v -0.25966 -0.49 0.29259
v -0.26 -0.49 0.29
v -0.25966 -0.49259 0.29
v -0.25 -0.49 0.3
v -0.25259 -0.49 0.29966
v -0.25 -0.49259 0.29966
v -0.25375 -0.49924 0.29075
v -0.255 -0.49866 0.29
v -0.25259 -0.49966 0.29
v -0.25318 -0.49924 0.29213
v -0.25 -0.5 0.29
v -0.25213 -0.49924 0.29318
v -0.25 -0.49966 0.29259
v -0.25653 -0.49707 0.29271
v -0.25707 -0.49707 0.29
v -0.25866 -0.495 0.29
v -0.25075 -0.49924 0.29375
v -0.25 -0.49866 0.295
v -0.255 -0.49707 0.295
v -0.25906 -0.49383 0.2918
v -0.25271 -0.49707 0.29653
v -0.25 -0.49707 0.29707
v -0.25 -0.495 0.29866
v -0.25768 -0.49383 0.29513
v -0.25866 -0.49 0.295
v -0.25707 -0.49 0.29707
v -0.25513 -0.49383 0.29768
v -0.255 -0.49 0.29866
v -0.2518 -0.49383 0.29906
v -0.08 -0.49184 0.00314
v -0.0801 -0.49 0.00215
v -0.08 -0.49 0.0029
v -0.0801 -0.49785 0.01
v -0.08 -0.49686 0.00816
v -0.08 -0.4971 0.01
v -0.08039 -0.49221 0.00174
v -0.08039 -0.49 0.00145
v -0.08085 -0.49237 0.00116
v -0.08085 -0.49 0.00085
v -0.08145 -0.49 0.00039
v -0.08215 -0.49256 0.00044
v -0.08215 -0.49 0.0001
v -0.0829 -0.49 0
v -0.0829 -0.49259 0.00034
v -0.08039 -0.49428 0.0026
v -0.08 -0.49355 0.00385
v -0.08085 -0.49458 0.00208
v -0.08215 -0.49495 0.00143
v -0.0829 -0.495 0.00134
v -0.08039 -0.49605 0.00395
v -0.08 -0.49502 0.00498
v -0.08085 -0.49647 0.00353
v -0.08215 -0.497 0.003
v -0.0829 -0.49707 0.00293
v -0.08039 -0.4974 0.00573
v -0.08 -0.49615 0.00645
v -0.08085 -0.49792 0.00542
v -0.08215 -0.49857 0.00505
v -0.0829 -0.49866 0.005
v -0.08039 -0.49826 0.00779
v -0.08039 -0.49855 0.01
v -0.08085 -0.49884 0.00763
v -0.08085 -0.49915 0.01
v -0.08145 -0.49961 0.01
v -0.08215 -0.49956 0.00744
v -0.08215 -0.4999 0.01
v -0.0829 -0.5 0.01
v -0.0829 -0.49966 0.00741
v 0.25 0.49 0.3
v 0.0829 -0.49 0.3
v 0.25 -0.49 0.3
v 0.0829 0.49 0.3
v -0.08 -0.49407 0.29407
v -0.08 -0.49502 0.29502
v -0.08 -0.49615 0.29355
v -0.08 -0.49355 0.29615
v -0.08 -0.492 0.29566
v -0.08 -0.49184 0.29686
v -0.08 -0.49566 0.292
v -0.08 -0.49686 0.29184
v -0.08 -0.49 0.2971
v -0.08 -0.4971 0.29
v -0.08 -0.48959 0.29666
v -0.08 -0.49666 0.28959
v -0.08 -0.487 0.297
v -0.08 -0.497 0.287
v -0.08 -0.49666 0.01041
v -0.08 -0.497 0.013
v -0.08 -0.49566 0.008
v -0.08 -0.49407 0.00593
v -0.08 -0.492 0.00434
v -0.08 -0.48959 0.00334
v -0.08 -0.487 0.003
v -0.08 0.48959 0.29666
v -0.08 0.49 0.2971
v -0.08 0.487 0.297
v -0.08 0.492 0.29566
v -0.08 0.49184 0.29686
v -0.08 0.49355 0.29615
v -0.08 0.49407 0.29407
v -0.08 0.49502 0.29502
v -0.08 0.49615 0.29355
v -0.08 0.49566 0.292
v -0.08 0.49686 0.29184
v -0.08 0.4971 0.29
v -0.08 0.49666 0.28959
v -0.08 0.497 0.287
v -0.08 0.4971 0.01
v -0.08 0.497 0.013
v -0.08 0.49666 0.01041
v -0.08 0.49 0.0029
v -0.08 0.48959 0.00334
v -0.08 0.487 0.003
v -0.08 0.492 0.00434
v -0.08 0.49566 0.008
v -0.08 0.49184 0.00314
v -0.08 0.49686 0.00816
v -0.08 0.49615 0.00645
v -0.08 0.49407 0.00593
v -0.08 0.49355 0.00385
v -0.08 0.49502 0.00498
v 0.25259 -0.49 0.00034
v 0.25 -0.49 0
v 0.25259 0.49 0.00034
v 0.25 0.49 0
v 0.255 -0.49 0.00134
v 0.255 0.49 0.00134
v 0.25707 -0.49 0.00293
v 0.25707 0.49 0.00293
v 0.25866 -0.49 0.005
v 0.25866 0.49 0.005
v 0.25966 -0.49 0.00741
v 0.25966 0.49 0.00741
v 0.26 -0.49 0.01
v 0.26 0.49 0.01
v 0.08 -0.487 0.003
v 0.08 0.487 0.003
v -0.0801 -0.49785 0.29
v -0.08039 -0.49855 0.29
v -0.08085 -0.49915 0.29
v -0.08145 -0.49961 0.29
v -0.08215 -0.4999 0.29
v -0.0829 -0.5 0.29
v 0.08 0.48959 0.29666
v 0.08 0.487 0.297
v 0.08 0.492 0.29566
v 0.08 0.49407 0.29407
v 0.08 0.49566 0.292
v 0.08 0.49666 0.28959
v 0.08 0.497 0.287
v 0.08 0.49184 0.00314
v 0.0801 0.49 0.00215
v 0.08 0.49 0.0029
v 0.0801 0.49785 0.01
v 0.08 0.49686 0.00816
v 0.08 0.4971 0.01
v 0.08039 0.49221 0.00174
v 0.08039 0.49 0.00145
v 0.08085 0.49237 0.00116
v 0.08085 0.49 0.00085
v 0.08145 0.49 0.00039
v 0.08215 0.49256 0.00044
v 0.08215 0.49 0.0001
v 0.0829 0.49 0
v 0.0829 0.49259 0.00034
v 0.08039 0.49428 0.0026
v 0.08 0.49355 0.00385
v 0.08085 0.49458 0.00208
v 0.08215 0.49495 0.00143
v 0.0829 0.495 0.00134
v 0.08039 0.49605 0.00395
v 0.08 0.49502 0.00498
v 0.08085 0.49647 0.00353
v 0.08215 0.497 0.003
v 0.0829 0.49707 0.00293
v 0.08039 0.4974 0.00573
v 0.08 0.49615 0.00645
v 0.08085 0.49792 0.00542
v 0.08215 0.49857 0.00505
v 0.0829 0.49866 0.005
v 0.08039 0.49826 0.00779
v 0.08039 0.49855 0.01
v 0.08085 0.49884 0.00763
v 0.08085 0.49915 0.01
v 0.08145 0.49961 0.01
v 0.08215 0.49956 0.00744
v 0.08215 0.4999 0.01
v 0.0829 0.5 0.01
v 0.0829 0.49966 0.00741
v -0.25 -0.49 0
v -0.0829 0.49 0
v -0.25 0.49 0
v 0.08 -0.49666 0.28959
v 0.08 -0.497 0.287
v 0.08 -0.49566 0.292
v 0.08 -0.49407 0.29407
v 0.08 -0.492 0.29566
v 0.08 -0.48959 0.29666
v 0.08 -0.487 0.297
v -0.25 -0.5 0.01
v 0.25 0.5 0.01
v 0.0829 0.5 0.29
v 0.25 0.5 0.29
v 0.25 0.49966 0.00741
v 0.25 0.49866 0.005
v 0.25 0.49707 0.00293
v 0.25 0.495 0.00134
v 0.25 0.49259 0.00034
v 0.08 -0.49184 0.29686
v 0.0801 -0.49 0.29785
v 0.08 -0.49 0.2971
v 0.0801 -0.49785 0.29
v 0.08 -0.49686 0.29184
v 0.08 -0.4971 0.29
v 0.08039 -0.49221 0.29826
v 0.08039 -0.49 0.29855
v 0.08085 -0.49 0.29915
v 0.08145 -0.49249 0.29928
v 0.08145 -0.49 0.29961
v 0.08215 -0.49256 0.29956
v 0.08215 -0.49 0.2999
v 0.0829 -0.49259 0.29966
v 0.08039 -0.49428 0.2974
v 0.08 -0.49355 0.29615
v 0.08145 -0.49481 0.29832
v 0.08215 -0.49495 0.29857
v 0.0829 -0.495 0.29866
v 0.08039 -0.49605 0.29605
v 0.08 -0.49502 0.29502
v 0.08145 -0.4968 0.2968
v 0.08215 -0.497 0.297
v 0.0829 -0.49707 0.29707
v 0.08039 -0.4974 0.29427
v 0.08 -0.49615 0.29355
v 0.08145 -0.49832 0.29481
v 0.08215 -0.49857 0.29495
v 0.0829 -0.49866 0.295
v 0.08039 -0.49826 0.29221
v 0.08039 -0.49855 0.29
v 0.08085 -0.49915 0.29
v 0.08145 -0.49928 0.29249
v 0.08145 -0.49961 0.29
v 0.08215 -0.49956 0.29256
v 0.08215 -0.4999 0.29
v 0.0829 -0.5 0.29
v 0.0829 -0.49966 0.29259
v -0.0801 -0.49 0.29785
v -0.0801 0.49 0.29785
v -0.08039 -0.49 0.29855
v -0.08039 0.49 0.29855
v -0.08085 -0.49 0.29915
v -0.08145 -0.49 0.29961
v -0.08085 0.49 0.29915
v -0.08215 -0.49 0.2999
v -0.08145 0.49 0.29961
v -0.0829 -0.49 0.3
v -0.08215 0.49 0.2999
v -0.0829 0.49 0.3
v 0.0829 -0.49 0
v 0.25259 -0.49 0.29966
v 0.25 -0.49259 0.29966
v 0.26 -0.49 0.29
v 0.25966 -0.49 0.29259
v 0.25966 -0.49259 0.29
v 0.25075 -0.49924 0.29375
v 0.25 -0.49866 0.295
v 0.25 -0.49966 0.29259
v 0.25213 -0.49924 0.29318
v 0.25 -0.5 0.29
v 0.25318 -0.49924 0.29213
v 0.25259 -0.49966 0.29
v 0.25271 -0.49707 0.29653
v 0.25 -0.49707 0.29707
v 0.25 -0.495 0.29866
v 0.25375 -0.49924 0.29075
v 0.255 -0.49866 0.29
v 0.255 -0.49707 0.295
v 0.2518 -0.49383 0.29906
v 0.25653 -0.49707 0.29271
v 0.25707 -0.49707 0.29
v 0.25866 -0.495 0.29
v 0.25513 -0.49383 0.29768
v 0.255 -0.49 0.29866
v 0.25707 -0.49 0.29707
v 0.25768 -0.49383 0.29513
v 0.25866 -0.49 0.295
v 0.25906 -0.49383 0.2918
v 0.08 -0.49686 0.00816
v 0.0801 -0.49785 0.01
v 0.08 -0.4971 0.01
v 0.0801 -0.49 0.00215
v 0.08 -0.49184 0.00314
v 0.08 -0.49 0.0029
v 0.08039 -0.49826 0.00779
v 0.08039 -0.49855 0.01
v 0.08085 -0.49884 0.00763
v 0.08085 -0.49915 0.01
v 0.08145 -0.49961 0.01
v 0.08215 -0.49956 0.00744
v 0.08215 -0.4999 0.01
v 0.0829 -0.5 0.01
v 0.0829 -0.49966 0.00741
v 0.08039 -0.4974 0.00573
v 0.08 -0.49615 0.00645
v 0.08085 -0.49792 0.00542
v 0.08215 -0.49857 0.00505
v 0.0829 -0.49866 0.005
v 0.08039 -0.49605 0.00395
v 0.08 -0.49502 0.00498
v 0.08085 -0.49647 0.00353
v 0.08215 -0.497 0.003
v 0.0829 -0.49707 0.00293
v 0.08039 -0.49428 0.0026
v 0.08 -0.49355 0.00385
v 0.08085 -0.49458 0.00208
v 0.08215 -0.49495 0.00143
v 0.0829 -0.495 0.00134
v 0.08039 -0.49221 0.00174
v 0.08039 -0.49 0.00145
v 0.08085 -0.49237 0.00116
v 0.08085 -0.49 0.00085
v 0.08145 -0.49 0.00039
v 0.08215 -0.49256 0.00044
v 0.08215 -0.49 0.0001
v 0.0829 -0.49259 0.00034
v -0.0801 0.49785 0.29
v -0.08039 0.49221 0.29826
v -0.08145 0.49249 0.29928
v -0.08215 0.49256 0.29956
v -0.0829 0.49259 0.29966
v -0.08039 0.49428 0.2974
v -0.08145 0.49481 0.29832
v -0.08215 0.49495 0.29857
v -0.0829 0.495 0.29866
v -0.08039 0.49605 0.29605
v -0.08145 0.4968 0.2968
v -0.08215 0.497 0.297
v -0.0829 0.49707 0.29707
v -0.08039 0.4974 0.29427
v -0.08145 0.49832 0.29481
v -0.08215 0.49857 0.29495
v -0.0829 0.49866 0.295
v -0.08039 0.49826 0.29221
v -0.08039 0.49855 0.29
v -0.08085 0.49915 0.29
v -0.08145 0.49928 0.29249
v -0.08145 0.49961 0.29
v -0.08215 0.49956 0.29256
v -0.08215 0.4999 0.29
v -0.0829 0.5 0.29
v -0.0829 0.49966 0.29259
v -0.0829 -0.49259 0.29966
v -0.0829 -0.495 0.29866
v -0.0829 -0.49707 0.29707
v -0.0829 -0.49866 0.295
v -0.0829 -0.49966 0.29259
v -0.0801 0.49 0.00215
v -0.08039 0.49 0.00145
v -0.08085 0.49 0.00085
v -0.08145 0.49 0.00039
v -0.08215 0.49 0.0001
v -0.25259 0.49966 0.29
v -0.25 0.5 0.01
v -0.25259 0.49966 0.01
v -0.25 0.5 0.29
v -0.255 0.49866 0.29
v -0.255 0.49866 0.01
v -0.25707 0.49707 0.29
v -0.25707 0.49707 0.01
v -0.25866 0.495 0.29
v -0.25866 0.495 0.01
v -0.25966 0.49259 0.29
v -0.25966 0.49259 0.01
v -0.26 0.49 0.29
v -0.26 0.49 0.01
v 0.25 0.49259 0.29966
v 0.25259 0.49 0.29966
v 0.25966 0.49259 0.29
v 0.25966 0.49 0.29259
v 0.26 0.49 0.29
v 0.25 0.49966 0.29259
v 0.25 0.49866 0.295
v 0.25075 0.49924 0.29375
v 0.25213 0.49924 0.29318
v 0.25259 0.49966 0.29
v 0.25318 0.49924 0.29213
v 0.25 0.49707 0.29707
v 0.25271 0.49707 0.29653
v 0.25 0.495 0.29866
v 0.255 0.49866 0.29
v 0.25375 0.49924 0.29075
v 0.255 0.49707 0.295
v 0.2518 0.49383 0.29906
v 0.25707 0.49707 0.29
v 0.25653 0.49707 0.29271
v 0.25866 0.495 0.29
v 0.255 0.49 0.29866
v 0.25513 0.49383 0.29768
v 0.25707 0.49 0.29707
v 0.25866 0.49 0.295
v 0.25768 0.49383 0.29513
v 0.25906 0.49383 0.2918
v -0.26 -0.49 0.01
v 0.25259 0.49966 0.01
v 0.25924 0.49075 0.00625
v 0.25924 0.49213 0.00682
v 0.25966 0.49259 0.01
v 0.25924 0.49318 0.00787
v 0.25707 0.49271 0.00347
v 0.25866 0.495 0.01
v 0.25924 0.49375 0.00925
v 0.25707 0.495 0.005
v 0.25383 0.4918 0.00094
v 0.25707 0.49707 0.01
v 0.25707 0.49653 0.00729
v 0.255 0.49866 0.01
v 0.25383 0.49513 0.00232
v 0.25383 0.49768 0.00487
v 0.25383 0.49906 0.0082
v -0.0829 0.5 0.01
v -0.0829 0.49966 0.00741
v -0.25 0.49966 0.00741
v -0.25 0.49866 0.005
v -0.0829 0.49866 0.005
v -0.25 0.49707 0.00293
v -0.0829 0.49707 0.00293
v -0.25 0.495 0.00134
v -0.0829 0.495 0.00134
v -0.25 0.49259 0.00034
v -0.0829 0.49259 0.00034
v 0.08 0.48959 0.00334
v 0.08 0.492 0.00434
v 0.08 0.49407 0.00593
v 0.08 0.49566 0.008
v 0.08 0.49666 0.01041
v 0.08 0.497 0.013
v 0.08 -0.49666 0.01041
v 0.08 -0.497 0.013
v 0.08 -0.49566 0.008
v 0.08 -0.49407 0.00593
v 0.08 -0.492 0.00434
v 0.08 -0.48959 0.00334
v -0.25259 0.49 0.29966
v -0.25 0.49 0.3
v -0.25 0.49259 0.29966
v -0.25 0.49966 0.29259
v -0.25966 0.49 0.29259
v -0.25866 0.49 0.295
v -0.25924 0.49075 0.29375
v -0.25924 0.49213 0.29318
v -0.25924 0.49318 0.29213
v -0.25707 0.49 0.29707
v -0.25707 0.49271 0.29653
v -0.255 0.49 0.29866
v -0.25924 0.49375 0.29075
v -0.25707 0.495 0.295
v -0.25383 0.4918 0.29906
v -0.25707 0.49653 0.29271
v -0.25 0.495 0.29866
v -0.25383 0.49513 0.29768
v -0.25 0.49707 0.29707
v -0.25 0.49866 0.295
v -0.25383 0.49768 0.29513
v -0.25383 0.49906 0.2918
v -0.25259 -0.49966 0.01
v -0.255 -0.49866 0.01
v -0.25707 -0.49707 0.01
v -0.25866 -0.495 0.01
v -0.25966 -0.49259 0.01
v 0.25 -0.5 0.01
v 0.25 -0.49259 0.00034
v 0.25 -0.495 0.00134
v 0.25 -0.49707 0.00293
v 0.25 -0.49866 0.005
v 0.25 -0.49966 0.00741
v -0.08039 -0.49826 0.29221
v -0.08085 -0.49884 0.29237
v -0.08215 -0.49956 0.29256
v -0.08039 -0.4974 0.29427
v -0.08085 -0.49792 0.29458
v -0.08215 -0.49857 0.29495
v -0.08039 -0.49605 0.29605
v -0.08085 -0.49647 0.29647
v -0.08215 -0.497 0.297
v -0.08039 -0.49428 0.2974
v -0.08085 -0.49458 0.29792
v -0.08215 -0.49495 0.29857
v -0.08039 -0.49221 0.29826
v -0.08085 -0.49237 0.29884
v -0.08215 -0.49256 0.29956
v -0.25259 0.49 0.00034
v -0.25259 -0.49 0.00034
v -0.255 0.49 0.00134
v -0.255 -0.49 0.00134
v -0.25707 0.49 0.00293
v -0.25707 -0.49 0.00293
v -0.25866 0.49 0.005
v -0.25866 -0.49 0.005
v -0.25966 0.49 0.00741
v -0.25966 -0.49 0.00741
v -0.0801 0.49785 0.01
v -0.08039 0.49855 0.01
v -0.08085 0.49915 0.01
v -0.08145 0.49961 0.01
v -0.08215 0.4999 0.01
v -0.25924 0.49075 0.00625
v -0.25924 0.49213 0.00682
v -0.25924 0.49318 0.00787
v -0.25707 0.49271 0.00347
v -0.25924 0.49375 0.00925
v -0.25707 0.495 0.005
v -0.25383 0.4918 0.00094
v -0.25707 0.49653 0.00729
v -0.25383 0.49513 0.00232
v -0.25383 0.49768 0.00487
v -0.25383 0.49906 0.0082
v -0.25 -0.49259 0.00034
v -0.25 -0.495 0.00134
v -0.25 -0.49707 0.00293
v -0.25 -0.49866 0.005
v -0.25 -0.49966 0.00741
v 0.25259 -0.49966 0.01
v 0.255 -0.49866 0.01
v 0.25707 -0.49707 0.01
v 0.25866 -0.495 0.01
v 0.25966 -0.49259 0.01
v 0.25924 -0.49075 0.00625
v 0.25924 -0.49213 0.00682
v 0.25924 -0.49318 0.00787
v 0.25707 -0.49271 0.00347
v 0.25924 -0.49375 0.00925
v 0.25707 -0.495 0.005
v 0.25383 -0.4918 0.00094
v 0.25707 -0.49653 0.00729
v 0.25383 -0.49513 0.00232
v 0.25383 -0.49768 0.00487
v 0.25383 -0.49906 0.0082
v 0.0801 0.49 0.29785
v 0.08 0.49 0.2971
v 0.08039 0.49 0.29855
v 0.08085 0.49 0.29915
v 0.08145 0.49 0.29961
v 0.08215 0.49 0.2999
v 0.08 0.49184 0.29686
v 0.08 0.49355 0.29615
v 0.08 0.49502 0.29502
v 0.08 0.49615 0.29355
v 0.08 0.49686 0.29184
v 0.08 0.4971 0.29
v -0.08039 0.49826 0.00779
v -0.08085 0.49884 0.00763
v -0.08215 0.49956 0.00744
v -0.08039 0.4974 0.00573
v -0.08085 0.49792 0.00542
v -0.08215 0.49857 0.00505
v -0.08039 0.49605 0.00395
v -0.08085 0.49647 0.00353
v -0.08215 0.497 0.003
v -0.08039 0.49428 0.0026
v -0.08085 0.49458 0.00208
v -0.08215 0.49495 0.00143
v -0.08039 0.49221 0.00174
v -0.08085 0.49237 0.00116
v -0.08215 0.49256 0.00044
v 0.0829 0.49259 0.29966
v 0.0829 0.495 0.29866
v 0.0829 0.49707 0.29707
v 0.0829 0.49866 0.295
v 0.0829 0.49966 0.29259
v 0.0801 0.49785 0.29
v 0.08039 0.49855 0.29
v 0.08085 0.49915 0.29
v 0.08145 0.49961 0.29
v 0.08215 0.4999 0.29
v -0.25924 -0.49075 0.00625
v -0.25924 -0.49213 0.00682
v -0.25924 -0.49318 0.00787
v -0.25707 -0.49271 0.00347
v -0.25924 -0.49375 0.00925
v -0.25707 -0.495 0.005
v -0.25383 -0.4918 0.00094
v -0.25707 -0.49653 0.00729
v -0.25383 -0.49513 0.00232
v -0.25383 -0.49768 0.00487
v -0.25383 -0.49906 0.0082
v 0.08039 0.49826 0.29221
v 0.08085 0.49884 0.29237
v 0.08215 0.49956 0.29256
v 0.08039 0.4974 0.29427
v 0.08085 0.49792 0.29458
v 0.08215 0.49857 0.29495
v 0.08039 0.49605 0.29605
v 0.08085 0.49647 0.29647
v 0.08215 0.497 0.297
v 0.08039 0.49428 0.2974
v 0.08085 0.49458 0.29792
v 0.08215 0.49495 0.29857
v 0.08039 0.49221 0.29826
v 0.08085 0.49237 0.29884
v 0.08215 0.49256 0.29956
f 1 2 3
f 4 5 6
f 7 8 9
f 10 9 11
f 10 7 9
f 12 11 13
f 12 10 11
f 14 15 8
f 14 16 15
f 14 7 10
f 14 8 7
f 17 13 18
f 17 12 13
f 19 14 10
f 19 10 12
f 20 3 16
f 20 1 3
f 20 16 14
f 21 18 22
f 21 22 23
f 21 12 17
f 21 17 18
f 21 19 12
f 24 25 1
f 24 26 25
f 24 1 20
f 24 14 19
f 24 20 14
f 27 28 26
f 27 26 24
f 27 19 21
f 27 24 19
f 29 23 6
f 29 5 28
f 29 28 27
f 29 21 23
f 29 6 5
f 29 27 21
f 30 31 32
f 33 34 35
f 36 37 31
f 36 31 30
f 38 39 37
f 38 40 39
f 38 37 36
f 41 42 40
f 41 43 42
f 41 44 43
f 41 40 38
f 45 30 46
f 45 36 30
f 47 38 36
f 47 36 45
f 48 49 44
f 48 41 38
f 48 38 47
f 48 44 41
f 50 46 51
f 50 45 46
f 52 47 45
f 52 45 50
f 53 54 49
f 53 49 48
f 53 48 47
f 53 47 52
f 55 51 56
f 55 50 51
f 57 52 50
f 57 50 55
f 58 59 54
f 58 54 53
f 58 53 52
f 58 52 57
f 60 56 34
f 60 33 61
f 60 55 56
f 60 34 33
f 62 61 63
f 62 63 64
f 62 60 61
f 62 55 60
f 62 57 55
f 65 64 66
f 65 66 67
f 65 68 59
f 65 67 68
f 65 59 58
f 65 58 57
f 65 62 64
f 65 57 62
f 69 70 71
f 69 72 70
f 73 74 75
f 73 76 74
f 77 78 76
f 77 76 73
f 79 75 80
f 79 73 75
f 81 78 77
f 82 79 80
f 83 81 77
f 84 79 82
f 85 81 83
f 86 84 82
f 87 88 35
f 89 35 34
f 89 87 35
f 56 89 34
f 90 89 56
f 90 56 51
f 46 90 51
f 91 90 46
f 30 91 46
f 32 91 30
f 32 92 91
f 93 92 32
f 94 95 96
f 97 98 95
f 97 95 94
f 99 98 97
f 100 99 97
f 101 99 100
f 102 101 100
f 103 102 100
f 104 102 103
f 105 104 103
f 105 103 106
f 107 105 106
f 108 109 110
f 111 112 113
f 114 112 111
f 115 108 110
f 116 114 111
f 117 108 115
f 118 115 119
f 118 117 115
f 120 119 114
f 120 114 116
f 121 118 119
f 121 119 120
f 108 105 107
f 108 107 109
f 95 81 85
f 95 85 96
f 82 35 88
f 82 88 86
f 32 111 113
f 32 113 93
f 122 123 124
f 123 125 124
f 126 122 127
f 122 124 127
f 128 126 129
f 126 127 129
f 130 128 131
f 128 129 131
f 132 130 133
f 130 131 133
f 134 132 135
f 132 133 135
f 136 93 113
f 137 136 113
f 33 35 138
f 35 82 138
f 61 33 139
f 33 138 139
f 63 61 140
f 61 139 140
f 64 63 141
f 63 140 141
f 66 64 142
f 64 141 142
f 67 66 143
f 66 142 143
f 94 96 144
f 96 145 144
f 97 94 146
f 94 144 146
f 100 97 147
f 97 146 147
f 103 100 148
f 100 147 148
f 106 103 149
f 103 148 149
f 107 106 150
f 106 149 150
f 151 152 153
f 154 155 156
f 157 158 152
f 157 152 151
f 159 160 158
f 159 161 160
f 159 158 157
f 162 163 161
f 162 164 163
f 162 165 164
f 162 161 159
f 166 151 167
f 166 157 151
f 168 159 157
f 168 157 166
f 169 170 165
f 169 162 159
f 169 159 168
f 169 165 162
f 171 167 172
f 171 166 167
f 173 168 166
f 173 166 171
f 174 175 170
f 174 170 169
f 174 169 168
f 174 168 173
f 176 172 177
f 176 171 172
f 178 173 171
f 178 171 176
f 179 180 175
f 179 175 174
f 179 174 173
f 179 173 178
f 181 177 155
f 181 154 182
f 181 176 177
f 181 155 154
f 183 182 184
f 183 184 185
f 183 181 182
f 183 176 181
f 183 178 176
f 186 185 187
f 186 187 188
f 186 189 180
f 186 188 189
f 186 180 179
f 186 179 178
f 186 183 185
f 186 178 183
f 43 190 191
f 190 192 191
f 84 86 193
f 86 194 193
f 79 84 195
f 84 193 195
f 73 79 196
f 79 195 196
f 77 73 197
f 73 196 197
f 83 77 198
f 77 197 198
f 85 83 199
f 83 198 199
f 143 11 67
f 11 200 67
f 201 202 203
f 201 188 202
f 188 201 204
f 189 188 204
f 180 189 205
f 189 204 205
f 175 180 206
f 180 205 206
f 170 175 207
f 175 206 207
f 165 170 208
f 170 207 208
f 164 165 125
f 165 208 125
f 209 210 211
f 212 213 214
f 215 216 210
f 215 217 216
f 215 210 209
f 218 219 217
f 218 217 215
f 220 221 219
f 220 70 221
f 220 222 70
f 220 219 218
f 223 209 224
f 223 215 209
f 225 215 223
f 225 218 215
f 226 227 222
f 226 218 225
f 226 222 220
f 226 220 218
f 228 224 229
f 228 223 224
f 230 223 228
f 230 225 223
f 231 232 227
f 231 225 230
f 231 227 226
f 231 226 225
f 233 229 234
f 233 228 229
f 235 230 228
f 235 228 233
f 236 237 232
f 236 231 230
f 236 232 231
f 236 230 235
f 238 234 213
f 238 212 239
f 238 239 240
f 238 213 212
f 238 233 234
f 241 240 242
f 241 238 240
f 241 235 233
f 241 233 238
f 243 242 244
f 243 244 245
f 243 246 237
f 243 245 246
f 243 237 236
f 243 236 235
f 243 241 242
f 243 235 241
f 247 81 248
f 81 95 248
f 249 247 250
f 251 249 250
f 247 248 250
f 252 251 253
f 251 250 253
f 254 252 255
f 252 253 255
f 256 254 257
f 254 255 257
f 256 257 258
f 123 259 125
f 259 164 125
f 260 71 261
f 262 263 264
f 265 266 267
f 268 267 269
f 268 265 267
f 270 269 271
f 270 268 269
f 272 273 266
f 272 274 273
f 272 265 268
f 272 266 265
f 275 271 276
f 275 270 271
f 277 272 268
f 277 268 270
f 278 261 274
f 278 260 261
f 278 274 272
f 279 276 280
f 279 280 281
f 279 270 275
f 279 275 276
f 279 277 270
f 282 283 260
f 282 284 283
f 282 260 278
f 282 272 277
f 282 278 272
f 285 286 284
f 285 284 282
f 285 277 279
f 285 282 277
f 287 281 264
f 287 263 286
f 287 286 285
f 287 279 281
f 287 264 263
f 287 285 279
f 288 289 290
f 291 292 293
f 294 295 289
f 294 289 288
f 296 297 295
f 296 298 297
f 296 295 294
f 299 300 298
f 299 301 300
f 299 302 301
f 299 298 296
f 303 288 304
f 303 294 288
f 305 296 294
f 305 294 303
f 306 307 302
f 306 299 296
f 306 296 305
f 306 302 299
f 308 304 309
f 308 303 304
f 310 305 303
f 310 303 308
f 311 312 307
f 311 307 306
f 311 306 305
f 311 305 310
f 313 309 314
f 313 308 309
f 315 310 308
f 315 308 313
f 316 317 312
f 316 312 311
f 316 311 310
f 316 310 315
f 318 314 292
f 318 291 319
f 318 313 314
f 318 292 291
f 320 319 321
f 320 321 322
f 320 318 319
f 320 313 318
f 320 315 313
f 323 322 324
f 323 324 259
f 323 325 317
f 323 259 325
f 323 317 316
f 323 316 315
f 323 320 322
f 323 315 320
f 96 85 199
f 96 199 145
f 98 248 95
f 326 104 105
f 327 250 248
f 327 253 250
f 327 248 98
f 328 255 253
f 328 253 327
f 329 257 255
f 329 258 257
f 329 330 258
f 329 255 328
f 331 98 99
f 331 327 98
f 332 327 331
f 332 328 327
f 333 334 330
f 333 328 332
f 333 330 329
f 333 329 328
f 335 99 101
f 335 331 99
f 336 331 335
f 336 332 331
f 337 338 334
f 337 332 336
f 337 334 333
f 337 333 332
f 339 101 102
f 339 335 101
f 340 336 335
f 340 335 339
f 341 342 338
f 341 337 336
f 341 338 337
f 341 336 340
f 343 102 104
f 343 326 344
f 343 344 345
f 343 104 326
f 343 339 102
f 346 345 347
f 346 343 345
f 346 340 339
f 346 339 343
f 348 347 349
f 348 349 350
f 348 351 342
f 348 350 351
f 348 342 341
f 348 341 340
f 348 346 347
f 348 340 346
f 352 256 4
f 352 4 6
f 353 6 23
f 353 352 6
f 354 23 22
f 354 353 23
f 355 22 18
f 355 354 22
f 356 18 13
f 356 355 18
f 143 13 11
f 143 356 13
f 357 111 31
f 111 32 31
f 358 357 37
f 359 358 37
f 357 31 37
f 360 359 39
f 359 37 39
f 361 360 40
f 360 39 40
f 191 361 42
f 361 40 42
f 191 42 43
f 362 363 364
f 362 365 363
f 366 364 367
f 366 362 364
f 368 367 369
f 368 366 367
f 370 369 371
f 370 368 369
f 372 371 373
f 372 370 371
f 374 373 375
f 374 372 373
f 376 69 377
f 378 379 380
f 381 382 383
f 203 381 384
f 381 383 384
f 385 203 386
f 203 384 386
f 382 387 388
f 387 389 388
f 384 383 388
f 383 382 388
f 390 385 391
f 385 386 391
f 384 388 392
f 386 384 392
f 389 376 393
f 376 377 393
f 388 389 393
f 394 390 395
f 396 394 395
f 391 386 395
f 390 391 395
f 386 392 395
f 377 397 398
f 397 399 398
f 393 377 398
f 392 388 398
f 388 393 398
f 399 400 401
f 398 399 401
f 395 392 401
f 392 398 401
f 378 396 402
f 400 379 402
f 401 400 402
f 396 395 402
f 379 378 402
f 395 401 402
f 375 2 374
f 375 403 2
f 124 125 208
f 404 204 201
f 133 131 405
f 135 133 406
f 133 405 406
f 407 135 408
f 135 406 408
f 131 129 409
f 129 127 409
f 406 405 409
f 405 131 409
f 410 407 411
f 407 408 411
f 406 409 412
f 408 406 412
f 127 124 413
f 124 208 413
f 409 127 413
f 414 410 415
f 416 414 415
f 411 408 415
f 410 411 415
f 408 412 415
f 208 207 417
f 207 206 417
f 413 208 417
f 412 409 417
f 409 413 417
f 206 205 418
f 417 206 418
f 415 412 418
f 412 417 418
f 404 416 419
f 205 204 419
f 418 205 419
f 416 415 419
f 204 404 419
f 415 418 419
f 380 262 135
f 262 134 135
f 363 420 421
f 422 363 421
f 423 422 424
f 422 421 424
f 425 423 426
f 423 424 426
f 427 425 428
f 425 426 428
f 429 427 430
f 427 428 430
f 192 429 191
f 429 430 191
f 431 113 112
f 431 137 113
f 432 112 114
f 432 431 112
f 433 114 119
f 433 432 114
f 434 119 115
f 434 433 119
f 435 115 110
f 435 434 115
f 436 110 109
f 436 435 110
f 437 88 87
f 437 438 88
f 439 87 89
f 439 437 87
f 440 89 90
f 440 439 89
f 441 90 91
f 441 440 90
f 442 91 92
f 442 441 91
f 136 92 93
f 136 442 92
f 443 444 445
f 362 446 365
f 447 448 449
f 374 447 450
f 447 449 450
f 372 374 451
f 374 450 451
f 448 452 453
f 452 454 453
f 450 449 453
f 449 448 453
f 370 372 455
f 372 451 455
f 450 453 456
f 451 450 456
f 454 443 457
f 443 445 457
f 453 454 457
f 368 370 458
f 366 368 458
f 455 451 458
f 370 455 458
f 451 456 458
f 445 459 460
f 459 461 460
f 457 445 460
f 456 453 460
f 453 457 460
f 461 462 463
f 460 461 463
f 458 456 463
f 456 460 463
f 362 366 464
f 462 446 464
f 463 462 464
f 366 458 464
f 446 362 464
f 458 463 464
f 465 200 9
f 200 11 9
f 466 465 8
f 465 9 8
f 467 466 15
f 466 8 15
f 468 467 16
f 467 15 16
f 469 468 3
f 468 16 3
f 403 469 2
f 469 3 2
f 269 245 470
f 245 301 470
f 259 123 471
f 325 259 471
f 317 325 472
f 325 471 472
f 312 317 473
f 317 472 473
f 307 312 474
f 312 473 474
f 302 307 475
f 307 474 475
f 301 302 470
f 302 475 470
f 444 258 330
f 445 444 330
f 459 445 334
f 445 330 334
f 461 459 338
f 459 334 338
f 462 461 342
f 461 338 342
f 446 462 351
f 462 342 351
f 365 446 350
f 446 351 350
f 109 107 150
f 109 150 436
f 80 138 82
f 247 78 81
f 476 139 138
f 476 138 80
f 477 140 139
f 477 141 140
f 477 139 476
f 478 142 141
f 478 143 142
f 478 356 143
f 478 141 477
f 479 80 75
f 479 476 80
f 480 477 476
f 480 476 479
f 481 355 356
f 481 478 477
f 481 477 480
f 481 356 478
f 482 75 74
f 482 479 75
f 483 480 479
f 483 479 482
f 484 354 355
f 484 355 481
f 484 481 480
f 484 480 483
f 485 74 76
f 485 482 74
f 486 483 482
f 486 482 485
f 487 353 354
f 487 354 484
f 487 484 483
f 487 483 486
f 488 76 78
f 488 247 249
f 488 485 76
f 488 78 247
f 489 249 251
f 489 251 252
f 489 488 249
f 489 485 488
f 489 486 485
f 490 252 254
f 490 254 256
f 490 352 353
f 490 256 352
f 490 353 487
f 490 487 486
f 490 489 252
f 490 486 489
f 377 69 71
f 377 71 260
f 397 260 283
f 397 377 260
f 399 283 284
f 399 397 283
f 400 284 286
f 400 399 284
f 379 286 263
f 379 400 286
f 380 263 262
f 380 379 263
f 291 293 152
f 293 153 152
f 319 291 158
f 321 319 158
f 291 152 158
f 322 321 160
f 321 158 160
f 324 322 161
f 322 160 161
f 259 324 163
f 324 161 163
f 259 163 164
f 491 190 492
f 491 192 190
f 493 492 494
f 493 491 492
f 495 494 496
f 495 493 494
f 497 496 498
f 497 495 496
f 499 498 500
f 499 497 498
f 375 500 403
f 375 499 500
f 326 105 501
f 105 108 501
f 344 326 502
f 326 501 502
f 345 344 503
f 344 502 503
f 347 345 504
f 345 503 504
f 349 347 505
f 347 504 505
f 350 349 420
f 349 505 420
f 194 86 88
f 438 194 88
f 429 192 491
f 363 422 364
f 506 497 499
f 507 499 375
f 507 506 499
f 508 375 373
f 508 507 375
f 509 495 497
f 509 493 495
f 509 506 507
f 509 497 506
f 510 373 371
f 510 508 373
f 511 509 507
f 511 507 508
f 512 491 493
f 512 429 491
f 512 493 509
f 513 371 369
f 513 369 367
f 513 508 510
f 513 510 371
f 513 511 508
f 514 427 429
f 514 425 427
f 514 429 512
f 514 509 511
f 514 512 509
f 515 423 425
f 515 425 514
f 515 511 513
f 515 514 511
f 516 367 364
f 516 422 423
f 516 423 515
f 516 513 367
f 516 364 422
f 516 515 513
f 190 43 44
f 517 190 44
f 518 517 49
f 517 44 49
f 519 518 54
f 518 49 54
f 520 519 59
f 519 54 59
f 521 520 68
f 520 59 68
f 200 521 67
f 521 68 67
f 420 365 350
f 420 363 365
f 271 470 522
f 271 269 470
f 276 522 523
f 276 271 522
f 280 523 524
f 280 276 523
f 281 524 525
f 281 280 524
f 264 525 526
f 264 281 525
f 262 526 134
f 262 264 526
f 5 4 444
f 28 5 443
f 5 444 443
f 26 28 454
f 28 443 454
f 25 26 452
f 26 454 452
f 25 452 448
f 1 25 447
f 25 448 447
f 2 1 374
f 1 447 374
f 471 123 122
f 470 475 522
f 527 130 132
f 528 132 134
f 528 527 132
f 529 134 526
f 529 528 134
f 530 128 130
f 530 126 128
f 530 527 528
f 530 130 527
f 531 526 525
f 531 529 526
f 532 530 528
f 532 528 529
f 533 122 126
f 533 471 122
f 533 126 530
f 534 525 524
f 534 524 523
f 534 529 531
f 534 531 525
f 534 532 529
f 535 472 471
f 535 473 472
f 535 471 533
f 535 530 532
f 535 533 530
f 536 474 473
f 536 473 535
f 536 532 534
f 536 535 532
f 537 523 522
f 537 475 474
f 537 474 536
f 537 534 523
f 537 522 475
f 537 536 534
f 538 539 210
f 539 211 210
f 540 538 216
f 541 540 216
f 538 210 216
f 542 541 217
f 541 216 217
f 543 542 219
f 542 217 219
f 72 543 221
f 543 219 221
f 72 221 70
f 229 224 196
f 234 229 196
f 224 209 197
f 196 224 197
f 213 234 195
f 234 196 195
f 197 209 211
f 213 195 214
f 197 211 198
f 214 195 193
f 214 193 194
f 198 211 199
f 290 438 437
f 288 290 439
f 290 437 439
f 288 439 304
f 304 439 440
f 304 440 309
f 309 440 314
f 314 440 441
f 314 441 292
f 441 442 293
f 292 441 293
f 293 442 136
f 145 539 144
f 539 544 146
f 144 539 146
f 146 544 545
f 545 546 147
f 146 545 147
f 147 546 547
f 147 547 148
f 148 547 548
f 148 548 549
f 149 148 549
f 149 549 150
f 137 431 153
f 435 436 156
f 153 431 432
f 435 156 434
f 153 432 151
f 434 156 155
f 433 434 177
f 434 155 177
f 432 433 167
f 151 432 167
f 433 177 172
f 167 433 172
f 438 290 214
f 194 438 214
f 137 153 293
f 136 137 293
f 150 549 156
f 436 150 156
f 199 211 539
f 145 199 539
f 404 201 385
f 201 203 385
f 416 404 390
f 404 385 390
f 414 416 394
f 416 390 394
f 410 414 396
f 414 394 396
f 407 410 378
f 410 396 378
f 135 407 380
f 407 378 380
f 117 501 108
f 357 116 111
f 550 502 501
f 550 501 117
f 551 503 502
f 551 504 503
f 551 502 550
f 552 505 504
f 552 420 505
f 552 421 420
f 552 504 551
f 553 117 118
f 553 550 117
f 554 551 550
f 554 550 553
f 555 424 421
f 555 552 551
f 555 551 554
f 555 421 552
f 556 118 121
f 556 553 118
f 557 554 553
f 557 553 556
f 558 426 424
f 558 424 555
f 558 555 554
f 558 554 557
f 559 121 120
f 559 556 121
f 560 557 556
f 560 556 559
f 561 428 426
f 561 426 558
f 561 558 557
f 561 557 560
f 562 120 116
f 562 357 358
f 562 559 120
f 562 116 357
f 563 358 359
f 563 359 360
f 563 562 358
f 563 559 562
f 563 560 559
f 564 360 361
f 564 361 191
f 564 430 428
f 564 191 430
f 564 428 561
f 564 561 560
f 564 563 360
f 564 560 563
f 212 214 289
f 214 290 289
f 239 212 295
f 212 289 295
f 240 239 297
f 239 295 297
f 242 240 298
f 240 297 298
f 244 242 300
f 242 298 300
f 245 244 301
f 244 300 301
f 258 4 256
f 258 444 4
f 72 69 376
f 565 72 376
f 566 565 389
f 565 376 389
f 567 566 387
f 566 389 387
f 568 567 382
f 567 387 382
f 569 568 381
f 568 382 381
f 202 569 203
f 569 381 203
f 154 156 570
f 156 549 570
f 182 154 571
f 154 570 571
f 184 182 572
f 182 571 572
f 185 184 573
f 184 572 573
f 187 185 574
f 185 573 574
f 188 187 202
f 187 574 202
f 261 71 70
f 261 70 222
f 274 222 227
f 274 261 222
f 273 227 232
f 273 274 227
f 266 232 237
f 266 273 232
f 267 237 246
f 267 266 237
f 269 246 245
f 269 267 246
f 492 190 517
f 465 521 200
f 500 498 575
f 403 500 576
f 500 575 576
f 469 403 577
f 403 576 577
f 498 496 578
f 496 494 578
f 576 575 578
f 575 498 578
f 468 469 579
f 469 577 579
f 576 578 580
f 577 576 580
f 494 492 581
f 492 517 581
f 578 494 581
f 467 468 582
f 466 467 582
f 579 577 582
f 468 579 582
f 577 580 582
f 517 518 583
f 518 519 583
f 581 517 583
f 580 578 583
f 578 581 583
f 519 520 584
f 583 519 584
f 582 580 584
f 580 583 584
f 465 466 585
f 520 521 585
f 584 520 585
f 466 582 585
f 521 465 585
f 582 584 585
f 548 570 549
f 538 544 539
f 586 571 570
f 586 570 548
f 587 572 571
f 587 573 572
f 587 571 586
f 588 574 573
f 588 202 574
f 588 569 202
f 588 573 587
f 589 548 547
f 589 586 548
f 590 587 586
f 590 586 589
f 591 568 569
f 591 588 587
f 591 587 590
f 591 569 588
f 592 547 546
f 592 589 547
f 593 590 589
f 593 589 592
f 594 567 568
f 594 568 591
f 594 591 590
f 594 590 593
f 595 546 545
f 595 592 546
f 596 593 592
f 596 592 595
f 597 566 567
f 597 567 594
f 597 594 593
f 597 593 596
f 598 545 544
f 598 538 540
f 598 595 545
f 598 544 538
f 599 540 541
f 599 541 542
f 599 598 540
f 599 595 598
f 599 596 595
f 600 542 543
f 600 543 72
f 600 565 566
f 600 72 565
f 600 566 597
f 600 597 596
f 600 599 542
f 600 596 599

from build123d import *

# Parameters (mm, degrees)
SKETCH1_W                           = 0.52
SKETCH1_H                           = 1
ALL_BODY_DEPTH                      = 0.3
CUT_OUT_THE_BODY_FOR_PIN_DEPTH      = 0.08
CUT_OUT_THE_BODY_FOR_PIN_DEPTH_BACK = 0.08
SKETCH2_OUTSIDE_W                   = 2.534
SKETCH2_OUTSIDE_H                   = 3.234
SKETCH2_OUTSIDE_W_2                 = 0.294
SKETCH2_OUTSIDE_H_2                 = 0.994
BODY_FILLET_R                       = 0.01
PIN_FILLET_A_R                      = 0.01
PIN_FILLET_B_R                      = 0.003


with BuildPart() as part:
    # Sketch1 → All body (new body)
    with BuildSketch(Plane.XY):
        Rectangle(SKETCH1_W, SKETCH1_H)
    extrude(amount=ALL_BODY_DEPTH)

    # Sketch2 outside → Cut out the body for pin (cut, two sides: drawn at the far end of the back side and taken through both)
    with BuildSketch(Plane(origin=(0, 0, 0), x_dir=(0, 0, -1), z_dir=(1, 0, 0)).offset(-CUT_OUT_THE_BODY_FOR_PIN_DEPTH_BACK)):
        with Locations((-0.15, 0)):
            Rectangle(SKETCH2_OUTSIDE_W, SKETCH2_OUTSIDE_H)
        with Locations((-0.15, 0)):
            Rectangle(SKETCH2_OUTSIDE_W_2, SKETCH2_OUTSIDE_H_2, mode=Mode.SUBTRACT)
    extrude(amount=CUT_OUT_THE_BODY_FOR_PIN_DEPTH + CUT_OUT_THE_BODY_FOR_PIN_DEPTH_BACK, mode=Mode.SUBTRACT)

    # Body fillet
    body_fillet_edges = [part.edges().sort_by_distance(p)[0] for p in [
        (0, 0.497, 0.003),
        (0, 0.497, 0.297),
        (0, -0.497, 0.297),
        (0, -0.497, 0.003),
    ]]
    fillet(body_fillet_edges, radius=BODY_FILLET_R)

    # Pin fillet a
    pin_fillet_a_edges = [part.edges().sort_by_distance(p)[0] for p in [
        (0.26, 0, 0.3),
        (-0.17, 0.5, 0),
        (0.17, -0.5, 0),
        (0.17, -0.5, 0.3),
        (-0.17, 0.5, 0.3),
        (0.17, 0.5, 0.3),
        (-0.26, 0, 0.3),
        (0.17, 0.5, 0),
        (0.26, 0, 0),
        (-0.17, -0.5, 0),
        (-0.26, 0, 0),
        (-0.26, 0.5, 0.15),
        (0.26, 0.5, 0.15),
        (0.26, -0.5, 0.15),
        (-0.26, -0.5, 0.15),
        (-0.17, -0.5, 0.3),
    ]]
    fillet(pin_fillet_a_edges, radius=PIN_FILLET_A_R)

    # Pin fillet b
    pin_fillet_b_edges = [part.edges().sort_by_distance(p)[0] for p in [
        (0.08, -0.5, 0.15),
        (0.08, 0, 0.3),
        (0.08, 0.5, 0.15),
        (0.08, 0, 0),
        (-0.08, 0.5, 0.15),
        (-0.08, 0, 0.3),
        (-0.08, -0.5, 0.15),
        (-0.08, 0, 0),
        (0.08, 0.497071068, 0.002928932),
        (0.08, -0.497071068, 0.002928932),
        (0.08, -0.497071068, 0.297071068),
        (0.08, 0.497071068, 0.297071068),
        (-0.08, -0.497071068, 0.297071068),
        (-0.08, 0.497071068, 0.297071068),
        (-0.08, -0.497071068, 0.002928932),
        (-0.08, 0.497071068, 0.002928932),
    ]]
    fillet(pin_fillet_b_edges, radius=PIN_FILLET_B_R - 0.0001)  # a hair under: the kernel refuses the full size


solid = part.part
